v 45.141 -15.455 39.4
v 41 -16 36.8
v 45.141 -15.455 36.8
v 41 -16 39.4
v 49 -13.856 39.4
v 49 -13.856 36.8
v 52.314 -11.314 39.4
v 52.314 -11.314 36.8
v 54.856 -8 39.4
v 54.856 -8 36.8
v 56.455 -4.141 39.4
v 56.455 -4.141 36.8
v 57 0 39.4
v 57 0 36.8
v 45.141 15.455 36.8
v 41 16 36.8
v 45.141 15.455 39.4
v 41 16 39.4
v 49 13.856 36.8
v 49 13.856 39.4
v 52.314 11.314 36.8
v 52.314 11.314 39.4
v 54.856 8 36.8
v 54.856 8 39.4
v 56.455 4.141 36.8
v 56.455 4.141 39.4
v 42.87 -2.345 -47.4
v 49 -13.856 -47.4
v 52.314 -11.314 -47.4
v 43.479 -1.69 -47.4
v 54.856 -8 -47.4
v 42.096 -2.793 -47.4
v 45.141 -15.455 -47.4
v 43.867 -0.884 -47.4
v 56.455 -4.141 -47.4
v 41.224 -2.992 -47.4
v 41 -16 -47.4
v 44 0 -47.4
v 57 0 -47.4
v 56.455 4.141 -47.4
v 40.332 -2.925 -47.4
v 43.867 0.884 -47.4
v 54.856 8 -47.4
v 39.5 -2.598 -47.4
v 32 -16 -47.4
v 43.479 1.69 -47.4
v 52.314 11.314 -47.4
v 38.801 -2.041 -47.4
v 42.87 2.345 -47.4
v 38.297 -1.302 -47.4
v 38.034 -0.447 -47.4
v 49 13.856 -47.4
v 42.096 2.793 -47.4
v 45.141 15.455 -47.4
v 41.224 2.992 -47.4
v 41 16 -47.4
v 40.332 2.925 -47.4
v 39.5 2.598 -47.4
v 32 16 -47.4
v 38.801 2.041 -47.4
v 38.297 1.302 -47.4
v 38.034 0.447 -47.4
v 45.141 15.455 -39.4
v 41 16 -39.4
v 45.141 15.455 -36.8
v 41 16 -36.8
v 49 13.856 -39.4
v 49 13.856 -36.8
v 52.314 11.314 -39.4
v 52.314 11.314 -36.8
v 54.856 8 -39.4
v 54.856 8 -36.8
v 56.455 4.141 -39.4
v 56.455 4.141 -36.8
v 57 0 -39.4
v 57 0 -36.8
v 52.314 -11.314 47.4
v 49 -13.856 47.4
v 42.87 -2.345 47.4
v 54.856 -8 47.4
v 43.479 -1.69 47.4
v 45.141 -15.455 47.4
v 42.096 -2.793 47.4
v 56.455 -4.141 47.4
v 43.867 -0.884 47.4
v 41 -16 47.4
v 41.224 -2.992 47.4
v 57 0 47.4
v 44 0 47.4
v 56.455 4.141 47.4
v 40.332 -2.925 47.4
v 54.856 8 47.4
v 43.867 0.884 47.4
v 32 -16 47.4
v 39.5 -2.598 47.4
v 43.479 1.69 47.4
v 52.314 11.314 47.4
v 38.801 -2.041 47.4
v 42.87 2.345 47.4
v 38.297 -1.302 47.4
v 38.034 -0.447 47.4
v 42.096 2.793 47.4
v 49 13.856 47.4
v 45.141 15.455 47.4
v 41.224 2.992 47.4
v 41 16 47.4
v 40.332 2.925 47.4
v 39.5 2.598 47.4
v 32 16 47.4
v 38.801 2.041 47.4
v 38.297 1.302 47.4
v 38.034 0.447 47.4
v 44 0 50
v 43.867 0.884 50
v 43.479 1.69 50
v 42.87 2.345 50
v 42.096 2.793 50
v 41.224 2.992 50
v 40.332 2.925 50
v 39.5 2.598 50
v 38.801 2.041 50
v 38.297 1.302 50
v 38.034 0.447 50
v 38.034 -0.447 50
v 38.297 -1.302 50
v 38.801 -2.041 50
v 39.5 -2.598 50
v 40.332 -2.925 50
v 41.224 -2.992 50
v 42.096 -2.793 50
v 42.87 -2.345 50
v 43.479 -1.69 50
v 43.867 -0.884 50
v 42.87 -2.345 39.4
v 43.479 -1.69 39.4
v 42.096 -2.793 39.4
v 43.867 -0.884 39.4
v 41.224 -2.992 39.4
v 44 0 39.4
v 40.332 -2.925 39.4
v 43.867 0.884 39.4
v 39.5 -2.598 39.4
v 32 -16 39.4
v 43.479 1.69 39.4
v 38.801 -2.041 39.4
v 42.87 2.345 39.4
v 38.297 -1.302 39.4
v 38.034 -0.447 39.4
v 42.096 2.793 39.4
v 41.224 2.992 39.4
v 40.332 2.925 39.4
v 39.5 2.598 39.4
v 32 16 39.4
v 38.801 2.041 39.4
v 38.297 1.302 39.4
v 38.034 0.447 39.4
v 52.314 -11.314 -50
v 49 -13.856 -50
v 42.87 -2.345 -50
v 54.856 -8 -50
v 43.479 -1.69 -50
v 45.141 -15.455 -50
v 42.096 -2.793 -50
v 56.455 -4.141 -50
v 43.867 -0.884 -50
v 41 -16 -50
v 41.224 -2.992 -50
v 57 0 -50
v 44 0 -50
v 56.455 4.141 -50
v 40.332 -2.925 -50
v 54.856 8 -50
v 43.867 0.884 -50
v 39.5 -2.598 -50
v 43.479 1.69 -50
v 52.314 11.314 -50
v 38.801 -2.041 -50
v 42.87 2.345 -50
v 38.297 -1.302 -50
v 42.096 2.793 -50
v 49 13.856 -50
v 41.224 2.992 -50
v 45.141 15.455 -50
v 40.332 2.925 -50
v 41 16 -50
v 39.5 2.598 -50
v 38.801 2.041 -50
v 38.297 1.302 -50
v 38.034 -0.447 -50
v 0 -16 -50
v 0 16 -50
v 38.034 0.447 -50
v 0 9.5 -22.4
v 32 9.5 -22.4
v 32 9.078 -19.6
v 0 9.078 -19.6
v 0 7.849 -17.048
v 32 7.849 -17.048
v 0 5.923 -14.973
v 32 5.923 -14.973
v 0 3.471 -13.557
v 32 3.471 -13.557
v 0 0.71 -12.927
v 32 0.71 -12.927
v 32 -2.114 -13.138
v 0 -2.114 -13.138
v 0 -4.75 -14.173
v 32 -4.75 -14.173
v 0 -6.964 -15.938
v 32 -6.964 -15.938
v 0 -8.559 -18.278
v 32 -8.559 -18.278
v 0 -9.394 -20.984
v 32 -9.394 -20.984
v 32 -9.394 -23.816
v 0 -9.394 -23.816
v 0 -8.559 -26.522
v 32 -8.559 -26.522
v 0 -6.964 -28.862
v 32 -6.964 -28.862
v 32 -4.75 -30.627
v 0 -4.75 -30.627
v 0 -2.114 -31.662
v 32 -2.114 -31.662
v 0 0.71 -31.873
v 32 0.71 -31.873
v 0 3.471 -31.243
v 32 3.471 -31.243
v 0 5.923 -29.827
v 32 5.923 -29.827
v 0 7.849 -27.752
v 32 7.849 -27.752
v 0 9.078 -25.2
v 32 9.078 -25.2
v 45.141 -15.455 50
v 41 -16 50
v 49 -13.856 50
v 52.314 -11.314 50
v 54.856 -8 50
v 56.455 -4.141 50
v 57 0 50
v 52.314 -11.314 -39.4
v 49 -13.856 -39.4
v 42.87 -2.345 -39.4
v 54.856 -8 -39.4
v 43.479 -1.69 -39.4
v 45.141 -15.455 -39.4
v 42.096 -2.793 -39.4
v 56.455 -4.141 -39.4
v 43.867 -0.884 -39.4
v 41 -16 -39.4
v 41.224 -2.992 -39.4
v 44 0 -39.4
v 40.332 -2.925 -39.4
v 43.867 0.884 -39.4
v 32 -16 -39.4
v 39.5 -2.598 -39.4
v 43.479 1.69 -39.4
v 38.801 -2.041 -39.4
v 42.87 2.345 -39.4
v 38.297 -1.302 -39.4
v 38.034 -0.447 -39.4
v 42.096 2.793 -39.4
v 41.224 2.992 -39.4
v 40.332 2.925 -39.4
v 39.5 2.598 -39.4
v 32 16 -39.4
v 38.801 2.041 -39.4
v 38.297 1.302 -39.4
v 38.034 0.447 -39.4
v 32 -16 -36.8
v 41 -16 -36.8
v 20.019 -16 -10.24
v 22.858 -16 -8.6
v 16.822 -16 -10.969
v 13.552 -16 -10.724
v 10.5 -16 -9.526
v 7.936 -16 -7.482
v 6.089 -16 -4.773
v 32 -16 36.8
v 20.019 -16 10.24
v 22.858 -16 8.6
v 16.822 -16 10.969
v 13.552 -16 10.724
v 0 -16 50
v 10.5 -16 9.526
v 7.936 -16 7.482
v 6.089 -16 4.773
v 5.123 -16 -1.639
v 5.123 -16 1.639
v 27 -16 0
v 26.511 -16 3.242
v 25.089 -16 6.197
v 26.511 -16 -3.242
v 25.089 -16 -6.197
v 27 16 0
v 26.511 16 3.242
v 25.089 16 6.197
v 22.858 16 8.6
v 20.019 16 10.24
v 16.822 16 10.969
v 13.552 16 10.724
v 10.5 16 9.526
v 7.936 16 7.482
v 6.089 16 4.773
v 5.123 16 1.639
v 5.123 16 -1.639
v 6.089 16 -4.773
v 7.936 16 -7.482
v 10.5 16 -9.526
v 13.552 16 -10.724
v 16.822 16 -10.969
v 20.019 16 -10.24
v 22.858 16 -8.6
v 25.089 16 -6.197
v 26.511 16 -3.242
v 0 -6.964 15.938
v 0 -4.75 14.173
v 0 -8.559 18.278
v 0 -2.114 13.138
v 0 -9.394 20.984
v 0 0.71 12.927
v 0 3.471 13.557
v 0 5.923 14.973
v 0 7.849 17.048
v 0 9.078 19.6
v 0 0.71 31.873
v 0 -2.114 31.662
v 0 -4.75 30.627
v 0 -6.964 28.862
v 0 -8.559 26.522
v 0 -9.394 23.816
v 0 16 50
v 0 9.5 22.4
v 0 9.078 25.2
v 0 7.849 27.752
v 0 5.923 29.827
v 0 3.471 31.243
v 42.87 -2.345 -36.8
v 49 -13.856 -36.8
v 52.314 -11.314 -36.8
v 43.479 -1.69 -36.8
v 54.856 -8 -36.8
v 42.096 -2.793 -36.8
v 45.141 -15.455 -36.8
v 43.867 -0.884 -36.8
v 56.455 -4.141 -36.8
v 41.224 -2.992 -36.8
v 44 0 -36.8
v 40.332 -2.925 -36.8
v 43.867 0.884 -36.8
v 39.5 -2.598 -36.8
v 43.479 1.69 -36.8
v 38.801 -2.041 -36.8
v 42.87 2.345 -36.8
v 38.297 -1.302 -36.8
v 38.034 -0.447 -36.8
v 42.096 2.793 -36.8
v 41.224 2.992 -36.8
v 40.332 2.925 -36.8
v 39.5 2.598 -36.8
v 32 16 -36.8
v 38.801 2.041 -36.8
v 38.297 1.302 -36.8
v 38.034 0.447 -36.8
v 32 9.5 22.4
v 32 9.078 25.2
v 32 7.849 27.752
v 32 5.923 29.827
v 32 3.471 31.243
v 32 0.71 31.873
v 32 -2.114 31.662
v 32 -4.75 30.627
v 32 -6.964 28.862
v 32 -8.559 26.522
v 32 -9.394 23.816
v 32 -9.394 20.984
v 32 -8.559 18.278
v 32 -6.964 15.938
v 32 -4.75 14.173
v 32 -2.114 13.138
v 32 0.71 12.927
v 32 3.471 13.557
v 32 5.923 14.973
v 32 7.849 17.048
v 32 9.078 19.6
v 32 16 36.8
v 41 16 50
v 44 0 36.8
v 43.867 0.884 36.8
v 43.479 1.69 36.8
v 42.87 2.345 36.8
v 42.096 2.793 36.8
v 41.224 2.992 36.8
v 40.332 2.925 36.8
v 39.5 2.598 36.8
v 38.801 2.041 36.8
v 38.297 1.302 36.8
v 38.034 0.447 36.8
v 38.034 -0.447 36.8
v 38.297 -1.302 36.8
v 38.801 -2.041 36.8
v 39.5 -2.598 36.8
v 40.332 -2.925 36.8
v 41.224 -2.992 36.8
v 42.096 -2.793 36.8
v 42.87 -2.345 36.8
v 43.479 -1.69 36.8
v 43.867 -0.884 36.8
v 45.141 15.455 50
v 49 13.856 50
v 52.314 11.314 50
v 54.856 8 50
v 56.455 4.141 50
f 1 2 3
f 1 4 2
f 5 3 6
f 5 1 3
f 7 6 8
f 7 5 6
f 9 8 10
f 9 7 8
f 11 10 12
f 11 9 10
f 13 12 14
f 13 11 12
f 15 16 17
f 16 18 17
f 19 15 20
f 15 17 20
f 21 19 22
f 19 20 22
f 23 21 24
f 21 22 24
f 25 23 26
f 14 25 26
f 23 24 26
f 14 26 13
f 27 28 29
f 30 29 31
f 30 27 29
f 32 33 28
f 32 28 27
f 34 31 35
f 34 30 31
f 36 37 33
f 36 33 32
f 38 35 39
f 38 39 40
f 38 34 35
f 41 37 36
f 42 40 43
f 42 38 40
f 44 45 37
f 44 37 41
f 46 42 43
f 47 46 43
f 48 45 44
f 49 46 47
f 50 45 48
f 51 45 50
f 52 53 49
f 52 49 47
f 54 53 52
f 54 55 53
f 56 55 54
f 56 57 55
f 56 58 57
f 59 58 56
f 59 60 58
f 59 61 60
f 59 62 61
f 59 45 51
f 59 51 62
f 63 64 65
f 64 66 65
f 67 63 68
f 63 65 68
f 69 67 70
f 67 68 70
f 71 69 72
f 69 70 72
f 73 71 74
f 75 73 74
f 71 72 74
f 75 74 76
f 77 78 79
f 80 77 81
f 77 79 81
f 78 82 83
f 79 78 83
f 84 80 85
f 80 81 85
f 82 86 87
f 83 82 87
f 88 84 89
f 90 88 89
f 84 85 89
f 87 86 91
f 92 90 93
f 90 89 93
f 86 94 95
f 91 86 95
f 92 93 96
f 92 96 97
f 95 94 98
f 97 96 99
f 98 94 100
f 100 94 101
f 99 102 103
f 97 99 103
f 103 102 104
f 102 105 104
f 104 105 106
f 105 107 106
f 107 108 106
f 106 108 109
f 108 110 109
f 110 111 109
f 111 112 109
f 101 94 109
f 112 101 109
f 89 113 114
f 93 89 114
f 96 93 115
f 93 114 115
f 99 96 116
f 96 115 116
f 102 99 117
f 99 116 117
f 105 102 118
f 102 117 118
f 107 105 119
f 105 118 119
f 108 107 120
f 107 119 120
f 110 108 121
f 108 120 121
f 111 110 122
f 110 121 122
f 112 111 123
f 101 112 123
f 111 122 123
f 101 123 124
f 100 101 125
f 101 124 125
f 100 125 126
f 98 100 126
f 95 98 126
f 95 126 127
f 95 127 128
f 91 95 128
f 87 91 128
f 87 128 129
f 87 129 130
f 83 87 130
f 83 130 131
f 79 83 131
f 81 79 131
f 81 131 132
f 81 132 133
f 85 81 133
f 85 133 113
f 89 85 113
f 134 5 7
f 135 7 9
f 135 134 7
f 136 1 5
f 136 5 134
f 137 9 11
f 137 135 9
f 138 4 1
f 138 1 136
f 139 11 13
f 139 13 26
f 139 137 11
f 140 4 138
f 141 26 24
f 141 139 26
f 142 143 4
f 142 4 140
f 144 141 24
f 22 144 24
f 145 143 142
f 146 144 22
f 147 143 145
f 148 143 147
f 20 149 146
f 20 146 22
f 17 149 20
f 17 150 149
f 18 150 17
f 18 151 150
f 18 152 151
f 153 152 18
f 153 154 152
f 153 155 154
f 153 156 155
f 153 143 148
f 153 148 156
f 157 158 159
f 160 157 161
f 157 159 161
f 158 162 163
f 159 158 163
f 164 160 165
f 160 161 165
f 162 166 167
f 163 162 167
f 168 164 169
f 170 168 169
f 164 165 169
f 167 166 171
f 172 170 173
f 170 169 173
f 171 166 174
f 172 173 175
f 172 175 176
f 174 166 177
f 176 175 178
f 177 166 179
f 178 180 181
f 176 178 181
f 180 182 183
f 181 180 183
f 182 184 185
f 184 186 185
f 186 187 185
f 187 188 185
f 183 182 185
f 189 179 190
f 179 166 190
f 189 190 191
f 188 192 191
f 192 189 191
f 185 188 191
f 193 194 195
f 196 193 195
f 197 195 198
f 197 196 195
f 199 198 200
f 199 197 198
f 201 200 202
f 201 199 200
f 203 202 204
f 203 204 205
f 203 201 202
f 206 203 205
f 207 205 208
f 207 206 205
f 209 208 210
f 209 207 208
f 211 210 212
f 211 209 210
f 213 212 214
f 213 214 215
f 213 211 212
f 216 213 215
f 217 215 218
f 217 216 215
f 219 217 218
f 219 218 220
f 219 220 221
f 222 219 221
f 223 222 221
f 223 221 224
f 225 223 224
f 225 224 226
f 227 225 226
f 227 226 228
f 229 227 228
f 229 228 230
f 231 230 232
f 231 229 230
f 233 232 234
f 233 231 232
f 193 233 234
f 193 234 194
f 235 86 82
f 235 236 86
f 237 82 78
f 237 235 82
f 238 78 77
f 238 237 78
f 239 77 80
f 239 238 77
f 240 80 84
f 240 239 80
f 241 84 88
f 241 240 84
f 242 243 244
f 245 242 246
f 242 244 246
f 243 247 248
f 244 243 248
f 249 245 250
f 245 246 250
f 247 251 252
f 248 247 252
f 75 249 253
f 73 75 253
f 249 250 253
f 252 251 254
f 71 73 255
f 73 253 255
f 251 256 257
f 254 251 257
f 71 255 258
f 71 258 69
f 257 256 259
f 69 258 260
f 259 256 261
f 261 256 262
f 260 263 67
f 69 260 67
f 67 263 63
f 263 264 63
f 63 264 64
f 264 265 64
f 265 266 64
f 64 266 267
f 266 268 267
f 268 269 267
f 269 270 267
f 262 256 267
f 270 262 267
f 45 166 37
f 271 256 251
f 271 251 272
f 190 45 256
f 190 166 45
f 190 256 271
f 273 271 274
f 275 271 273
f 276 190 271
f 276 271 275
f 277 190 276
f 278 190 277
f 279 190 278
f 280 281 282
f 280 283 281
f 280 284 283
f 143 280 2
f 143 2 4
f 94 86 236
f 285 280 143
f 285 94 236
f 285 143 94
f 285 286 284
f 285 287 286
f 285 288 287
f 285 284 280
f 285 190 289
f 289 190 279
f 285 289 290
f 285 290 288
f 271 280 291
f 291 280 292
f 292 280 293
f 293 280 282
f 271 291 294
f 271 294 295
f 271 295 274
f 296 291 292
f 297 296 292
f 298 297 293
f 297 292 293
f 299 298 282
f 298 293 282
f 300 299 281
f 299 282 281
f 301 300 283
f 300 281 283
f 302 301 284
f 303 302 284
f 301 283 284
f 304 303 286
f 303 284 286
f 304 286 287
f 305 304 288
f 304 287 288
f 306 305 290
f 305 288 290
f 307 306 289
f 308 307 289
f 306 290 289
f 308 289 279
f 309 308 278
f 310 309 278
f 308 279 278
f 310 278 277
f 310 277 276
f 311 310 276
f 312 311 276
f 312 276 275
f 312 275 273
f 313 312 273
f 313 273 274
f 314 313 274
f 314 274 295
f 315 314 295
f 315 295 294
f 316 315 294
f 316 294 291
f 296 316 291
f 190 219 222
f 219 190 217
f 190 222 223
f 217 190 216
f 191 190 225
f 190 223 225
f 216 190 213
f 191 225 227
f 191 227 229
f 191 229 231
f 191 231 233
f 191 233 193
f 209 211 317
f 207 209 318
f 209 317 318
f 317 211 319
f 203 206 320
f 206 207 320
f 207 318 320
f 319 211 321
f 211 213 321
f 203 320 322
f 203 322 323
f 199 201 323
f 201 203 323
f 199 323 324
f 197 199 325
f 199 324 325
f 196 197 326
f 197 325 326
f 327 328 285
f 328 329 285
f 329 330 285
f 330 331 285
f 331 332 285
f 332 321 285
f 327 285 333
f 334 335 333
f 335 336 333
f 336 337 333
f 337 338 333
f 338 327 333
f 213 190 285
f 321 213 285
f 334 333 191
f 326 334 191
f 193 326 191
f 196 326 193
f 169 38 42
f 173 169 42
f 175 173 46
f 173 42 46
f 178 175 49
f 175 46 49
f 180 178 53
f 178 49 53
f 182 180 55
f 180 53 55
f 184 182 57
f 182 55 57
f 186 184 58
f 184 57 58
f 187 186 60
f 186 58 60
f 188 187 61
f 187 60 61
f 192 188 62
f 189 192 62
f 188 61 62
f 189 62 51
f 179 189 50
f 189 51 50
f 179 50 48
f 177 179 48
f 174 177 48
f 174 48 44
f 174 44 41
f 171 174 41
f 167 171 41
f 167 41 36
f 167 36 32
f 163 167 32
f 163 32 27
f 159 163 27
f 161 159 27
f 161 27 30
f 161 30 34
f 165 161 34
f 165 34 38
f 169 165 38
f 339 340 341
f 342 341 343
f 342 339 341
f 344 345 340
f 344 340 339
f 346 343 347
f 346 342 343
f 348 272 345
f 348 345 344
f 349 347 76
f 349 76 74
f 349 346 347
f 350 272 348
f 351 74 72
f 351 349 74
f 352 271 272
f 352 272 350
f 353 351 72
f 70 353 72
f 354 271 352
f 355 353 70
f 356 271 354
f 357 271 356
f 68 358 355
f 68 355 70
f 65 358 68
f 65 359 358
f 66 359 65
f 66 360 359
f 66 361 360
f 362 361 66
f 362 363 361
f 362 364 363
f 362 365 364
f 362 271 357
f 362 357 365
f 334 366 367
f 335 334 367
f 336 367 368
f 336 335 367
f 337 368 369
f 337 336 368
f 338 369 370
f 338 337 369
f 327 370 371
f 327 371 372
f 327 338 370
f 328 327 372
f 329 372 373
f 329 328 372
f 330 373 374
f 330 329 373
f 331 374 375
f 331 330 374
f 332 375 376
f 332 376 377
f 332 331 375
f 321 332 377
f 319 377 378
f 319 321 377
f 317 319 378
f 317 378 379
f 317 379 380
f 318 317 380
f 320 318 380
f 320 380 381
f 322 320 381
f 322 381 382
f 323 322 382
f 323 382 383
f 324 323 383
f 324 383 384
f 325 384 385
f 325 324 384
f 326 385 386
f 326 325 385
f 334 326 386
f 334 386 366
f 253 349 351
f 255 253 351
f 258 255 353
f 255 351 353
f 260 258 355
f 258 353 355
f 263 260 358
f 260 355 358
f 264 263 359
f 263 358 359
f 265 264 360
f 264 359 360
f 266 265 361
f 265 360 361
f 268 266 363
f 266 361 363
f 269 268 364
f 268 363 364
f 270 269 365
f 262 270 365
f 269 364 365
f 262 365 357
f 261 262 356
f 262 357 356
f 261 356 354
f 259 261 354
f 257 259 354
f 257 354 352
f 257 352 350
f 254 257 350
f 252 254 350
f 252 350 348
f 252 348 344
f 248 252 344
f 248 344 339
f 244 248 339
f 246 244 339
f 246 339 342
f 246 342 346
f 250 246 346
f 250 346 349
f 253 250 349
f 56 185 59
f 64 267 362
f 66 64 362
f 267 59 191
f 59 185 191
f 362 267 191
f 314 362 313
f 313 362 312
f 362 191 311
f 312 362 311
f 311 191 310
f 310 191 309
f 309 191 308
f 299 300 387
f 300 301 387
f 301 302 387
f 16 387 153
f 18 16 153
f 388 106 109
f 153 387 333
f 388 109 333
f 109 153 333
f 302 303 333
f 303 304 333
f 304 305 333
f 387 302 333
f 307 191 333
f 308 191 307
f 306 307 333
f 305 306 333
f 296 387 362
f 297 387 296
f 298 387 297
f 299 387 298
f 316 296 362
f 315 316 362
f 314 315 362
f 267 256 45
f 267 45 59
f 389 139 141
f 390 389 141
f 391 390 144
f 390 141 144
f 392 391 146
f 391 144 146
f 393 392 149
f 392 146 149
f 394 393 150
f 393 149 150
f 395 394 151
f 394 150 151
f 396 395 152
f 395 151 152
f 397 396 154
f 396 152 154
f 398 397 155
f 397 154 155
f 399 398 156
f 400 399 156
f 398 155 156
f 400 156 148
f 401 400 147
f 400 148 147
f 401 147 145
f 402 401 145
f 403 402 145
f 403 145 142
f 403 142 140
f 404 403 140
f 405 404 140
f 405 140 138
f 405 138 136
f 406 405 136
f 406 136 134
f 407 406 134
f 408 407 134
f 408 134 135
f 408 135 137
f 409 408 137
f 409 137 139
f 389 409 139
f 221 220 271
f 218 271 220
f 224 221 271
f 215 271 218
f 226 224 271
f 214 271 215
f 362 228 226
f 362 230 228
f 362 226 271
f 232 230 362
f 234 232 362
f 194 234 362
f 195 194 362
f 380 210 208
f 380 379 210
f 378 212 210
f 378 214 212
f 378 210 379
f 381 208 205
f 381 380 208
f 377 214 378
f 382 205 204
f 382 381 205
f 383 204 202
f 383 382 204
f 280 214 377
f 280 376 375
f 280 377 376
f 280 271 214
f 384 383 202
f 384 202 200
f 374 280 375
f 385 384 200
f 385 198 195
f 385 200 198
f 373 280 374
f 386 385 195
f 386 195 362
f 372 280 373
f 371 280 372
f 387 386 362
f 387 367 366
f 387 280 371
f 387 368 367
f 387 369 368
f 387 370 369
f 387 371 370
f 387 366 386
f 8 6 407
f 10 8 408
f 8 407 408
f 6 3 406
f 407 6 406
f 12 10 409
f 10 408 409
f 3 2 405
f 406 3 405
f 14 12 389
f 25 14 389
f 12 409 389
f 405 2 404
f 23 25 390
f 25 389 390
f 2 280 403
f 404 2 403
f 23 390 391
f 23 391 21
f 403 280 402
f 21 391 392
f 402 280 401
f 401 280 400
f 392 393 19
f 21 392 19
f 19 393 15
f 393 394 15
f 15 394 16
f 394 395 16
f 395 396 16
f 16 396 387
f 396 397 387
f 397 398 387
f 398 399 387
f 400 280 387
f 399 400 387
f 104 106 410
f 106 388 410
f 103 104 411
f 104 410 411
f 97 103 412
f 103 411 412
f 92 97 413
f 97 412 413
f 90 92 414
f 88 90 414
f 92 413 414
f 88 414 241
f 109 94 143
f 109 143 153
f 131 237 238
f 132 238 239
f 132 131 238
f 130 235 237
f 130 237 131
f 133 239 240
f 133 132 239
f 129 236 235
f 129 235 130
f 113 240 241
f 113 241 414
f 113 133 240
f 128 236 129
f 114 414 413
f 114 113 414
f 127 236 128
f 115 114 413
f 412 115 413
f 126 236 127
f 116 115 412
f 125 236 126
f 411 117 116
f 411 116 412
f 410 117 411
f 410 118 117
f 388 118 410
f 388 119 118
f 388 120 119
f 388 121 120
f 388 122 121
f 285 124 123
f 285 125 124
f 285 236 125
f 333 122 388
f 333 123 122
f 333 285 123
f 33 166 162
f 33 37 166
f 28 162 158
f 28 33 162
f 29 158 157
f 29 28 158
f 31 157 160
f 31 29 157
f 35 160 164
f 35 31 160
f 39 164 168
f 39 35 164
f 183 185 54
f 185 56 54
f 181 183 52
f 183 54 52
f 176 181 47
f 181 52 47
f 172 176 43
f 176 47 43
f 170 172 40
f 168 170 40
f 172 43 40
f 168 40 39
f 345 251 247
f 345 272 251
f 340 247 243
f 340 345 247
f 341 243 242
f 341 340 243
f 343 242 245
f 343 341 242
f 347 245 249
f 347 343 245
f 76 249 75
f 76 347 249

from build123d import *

# Parameters (mm, degrees)
F0_W     = 32
F0_H     = 100
F0_R     = 9.5
F1_DEPTH = 32
F2_R     = 11
F3_DEPTH = 32.001
F4_W     = 32
F4_H     = 2.6
F5_DEPTH = 25
F6_R     = 15.99999
F7_R     = 3
F8_DEPTH = 100.001


# Not quite as in the source:
# - a fillet or chamfer is up to 0.001 mm smaller than in the source, because OpenCascade refuses the exact size


with BuildPart() as f1:
    # F0 (on Right) → F1 (new body)
    with BuildSketch(Plane.YZ):
        Rectangle(F0_W, F0_H)
        with Locations((0, -22.4)):
            Circle(F0_R, mode=Mode.SUBTRACT)
        with Locations((0, 22.4)):
            Circle(F0_R, mode=Mode.SUBTRACT)
    extrude(amount=F1_DEPTH)

    # F2 (on face) → F3 (cut, through all)
    with BuildSketch(Plane.XZ.offset(16)):
        with Locations((16, 0)):
            Circle(F2_R)
    extrude(amount=-F3_DEPTH, mode=Mode.SUBTRACT)

    # F4 (on face) → F5 (join)
    with BuildSketch(Plane.YZ.offset(32)):
        with Locations((0, 48.7)):
            Rectangle(F4_W, F4_H)
        with Locations((0, 38.1)):
            Rectangle(F4_W, F4_H)
        with Locations((0, -38.1)):
            Rectangle(F4_W, F4_H)
        with Locations((0, -48.7)):
            Rectangle(F4_W, F4_H)
    extrude(amount=F5_DEPTH)

    # F6 (radius 16 in the source; OpenCascade refuses exactly that, so slightly less here)
    f6_edges = [f1.edges().sort_by_distance(p)[0] for p in [
        (57, -16, 48.7),
        (57, -16, 38.1),
        (57, 16, 38.1),
        (57, 16, 48.7),
        (57, 16, -48.7),
        (57, -16, -48.7),
        (57, -16, -38.1),
        (57, 16, -38.1),
    ]]
    fillet(f6_edges, radius=F6_R)

    # F7 (on face) → F8 (cut, through all)
    with BuildSketch(Plane.XY.offset(50)):
        with Locations((41, 0)):
            Circle(F7_R)
    extrude(amount=-F8_DEPTH, mode=Mode.SUBTRACT)


solid = f1.part
